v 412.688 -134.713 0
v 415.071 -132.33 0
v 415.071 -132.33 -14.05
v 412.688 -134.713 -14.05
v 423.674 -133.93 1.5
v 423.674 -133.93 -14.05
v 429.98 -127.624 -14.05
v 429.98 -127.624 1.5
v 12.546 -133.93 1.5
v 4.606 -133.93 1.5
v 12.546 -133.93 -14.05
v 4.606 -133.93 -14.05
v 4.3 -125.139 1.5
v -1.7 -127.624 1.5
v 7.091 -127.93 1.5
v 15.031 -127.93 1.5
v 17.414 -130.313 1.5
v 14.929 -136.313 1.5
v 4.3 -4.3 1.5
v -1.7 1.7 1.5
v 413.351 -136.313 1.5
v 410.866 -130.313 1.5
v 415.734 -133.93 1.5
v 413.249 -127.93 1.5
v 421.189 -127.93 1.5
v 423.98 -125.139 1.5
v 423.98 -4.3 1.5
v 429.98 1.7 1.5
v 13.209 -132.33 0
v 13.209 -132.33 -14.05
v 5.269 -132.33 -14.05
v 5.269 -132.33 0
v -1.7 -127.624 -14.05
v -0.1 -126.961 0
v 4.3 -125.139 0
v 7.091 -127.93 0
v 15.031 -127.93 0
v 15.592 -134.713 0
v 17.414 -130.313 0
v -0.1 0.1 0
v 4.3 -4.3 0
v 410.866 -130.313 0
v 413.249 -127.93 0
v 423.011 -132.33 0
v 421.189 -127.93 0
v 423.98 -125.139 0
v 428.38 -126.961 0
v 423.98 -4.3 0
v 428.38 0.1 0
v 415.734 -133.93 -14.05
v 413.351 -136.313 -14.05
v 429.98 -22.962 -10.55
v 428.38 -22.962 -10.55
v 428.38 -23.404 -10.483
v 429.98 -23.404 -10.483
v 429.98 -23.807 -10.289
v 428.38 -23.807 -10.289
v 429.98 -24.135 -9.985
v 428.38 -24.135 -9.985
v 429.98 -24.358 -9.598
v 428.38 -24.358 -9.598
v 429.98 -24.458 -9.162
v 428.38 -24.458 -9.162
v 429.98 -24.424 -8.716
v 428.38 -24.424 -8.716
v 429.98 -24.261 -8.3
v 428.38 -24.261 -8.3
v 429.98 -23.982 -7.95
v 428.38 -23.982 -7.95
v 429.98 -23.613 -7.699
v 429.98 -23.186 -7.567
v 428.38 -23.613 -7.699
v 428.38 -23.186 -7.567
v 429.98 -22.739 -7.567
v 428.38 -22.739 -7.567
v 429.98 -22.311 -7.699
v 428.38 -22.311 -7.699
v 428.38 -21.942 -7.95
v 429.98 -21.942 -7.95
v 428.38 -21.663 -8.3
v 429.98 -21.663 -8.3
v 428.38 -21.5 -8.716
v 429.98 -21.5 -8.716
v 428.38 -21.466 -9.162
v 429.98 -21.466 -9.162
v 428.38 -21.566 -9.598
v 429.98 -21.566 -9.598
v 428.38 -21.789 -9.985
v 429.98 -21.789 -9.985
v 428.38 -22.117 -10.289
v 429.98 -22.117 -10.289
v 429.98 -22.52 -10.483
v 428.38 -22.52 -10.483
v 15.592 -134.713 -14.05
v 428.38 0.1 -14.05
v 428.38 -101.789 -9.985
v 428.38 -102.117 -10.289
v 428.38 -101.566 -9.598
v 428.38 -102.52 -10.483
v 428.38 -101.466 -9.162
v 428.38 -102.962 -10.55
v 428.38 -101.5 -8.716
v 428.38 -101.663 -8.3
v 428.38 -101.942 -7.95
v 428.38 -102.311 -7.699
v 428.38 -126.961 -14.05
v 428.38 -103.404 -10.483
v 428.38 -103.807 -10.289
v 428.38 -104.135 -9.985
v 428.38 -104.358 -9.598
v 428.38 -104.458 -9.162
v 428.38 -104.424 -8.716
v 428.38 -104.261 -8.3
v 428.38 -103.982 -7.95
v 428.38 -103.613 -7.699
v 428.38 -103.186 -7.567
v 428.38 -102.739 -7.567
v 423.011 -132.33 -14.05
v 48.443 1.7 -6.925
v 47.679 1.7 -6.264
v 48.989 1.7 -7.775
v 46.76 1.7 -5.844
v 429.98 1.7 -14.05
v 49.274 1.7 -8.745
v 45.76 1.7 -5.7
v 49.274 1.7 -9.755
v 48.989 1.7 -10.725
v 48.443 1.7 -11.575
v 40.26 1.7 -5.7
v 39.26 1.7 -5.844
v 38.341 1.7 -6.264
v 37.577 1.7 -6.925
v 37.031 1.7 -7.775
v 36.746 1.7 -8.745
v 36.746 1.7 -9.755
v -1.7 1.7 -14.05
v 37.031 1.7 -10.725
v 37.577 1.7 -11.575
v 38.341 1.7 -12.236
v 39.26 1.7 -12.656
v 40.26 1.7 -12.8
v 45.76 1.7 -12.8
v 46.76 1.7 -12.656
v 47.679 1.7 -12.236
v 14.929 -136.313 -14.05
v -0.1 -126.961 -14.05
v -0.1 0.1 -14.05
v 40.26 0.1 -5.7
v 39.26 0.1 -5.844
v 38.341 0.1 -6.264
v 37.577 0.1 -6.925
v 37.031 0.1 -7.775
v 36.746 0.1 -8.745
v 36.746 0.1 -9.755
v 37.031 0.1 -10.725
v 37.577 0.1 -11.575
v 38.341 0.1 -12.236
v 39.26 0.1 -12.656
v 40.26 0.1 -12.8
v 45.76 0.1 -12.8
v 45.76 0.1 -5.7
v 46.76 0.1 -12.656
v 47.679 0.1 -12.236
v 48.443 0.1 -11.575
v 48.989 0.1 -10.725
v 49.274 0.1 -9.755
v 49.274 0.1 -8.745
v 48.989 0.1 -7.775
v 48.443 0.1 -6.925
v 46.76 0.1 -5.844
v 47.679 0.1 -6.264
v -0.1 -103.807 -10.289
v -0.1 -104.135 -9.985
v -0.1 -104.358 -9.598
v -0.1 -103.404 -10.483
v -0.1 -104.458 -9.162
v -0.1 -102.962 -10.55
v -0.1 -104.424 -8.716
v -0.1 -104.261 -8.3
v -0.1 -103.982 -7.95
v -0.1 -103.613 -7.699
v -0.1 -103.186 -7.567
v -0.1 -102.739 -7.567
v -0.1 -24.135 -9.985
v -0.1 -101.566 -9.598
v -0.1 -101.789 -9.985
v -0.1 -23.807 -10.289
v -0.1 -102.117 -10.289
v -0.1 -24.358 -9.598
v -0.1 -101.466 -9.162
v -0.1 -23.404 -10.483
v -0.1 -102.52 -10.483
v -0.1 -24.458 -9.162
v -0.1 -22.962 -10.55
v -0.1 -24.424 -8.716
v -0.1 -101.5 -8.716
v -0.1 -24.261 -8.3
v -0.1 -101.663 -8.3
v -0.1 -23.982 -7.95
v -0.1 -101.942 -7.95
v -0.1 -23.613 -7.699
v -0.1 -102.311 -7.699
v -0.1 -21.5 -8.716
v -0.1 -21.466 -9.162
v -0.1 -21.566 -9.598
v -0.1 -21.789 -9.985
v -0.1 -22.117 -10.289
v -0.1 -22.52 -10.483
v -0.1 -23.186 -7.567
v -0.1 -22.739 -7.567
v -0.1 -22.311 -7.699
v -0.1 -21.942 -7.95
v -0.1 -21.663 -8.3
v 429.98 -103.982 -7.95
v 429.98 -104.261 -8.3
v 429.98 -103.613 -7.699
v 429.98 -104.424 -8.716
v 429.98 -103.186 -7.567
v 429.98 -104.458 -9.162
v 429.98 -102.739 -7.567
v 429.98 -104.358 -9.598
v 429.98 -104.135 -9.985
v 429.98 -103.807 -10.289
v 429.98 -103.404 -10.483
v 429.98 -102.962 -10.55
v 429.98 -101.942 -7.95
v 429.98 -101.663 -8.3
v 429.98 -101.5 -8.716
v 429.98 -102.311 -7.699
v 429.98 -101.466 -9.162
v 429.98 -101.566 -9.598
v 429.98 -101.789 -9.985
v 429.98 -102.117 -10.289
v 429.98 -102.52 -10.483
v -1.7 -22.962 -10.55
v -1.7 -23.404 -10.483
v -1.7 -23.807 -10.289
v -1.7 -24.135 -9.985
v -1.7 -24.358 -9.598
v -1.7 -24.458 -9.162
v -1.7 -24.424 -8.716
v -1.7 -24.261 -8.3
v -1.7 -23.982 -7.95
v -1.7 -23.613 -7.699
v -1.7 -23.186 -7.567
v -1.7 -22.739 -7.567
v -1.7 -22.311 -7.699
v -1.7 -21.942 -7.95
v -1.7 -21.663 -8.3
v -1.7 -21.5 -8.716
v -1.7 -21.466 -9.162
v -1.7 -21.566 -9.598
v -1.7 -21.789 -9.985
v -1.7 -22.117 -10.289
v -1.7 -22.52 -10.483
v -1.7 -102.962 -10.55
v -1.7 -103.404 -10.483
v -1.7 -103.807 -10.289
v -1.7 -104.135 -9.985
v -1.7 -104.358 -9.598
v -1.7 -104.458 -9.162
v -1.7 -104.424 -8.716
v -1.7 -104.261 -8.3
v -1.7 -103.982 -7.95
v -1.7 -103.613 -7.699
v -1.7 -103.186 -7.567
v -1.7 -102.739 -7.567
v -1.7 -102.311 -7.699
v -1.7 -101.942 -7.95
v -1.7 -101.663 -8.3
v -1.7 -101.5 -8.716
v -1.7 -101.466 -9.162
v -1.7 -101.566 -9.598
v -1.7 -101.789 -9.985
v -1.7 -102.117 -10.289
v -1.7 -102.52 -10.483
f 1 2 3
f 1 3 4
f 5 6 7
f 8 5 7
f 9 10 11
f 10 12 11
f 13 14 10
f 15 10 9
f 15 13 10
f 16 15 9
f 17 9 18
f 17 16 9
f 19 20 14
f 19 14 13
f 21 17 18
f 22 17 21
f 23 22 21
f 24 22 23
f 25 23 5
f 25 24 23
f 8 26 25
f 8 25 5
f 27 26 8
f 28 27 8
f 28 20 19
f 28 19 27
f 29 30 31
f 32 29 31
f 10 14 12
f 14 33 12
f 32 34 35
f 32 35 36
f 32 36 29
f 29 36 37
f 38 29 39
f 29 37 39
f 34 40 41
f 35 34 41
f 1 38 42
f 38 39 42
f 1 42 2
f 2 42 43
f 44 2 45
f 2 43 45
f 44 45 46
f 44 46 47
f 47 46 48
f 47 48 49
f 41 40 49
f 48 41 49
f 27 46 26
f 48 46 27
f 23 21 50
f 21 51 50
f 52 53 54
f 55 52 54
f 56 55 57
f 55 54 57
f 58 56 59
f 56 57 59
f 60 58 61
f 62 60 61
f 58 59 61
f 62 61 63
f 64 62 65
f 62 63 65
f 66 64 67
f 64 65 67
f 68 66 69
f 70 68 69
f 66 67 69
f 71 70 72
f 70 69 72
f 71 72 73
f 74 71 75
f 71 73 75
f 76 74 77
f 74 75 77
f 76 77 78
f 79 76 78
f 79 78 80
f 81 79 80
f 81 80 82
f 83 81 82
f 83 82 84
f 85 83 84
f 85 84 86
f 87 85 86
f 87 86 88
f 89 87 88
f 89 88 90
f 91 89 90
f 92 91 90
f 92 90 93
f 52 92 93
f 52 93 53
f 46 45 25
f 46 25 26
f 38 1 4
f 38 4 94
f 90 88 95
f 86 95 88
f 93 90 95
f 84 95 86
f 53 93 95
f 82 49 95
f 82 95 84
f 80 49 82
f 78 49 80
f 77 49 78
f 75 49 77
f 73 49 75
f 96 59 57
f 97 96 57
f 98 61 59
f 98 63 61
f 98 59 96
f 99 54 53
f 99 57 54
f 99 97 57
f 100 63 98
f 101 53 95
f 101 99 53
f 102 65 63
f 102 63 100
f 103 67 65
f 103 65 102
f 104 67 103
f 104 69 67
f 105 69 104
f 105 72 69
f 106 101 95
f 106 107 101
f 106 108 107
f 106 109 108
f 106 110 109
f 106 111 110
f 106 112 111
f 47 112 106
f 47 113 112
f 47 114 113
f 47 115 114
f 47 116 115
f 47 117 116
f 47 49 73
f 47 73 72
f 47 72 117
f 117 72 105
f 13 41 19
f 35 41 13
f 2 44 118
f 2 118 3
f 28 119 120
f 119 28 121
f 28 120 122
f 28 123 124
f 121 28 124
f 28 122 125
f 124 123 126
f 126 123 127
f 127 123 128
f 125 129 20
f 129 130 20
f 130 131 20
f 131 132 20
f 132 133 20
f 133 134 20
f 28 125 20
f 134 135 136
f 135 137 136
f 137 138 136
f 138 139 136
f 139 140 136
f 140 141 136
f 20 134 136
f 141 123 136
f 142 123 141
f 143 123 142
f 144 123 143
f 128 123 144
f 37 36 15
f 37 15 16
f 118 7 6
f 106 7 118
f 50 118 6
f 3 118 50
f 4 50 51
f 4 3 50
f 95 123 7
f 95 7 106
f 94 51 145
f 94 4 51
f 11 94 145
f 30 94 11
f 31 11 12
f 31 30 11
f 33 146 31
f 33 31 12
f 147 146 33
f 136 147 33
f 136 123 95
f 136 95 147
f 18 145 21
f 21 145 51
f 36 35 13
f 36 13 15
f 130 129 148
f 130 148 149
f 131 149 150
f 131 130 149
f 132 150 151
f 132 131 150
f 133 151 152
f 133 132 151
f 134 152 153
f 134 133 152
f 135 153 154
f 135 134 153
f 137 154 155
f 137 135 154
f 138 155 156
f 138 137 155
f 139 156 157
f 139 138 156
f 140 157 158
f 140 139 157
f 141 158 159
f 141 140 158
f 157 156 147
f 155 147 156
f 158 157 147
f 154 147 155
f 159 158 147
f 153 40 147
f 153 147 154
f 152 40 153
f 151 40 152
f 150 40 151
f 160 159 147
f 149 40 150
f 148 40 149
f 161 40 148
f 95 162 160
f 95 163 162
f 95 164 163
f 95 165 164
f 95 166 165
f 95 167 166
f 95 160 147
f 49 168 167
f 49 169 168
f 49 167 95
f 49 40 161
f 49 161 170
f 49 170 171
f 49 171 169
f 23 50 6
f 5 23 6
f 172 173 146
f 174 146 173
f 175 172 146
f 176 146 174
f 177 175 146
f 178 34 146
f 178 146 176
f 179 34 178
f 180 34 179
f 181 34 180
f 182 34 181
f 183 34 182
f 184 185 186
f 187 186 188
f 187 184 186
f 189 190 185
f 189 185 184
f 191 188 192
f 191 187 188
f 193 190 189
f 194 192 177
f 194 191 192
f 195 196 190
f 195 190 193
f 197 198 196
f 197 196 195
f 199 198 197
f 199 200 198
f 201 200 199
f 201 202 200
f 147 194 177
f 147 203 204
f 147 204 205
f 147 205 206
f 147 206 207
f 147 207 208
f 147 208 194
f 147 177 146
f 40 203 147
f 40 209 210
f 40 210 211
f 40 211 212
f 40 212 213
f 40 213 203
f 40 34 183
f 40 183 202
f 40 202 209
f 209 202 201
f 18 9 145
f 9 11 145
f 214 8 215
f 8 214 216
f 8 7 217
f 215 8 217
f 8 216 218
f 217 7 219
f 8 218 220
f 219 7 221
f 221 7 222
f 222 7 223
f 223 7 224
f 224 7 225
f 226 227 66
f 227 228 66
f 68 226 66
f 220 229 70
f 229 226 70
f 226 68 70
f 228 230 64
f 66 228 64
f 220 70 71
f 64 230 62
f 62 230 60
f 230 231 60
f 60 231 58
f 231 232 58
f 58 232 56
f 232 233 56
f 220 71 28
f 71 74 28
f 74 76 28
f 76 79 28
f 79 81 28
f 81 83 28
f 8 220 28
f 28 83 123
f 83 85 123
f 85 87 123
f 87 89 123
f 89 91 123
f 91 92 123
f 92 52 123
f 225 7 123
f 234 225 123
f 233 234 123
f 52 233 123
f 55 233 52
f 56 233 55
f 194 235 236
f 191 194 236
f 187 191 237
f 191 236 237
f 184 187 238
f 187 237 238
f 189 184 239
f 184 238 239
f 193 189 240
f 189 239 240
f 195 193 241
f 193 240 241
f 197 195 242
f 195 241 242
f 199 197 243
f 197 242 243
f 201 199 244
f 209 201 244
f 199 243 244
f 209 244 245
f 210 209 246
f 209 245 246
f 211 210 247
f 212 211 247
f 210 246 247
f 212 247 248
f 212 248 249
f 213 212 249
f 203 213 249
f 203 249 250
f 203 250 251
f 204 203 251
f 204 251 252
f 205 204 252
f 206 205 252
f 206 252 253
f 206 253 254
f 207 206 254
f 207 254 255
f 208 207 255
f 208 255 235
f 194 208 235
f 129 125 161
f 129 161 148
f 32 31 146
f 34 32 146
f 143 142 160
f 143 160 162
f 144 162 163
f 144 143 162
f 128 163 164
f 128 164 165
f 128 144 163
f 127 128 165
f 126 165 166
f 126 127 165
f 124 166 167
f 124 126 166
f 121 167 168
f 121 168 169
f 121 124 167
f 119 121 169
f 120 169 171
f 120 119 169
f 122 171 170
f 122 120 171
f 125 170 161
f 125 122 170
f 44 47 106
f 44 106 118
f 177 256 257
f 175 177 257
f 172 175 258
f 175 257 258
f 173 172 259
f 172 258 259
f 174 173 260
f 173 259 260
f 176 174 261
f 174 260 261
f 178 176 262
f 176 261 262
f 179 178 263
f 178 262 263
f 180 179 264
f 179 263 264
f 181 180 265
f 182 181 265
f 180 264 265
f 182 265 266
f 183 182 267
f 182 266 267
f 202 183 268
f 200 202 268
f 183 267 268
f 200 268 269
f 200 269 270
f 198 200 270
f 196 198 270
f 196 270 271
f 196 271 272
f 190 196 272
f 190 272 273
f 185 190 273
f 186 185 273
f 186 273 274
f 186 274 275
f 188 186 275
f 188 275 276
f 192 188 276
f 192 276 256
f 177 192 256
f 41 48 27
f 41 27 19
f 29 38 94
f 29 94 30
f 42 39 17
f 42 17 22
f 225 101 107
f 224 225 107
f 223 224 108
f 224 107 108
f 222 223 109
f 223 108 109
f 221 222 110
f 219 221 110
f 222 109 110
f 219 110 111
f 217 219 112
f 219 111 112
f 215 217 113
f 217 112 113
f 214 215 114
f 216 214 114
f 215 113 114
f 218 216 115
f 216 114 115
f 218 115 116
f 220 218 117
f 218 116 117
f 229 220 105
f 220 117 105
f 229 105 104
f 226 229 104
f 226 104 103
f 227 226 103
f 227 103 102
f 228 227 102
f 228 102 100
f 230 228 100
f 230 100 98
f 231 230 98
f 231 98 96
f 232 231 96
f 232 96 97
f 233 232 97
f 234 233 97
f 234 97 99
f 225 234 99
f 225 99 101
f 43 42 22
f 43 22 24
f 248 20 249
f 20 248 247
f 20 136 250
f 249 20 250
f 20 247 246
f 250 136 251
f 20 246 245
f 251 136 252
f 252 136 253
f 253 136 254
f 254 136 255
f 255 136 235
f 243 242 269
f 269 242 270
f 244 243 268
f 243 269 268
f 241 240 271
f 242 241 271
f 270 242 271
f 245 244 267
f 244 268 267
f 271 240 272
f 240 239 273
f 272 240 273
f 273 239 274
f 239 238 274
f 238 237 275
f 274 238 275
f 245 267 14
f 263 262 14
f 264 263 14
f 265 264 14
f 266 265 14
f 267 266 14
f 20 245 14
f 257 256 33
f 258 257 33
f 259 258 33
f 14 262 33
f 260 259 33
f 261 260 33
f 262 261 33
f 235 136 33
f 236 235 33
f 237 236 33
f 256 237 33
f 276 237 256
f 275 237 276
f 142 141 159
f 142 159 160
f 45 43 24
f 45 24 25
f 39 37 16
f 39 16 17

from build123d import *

# Parameters (mm, degrees)
P_IDAT_VYSUNUT_M1_DEPTH  = 14.05
P_IDAT_VYSUNUT_M2_DEPTH  = 1.5
ODEBRAT_VYSUNUT_M1_DEPTH = 1.6
ODEBRAT_VYSUNUT_M2_REACH = 454.909
SKICA4_R                 = 1.5


with BuildPart() as part:
    # Skica1 → Přidat vysunutím1 (new body)
    with BuildSketch(Plane.XY):
        Polygon((-1.7, 1.7), (429.98, 1.7), (429.98, -127.624163056), (423.673791129, -133.930371927), (415.733791129, -133.930371927), (413.350841277, -136.313321779), (14.929158723, -136.313321779), (12.546208871, -133.930371927), (4.606208871, -133.930371927), (-1.7, -127.624163056), align=None)
        Polygon((-0.1, 0.1), (428.38, 0.1), (428.38, -126.961421356), (423.01104943, -132.330371927), (415.07104943, -132.330371927), (412.688099577, -134.713321779), (15.591900423, -134.713321779), (13.20895057, -132.330371927), (5.26895057, -132.330371927), (-0.1, -126.961421356), align=None, mode=Mode.SUBTRACT)
    extrude(amount=-P_IDAT_VYSUNUT_M1_DEPTH)

    # Skica2 → Přidat vysunutím2 (add)
    with BuildSketch(Plane.XY):
        Polygon((-1.7, 1.7), (-1.7, -127.624163056), (4.606208871, -133.930371927), (12.546208871, -133.930371927), (14.929158723, -136.313321779), (413.350841277, -136.313321779), (415.733791129, -133.930371927), (423.673791129, -133.930371927), (429.98, -127.624163056), (429.98, 1.7), align=None)
        Polygon((4.3, -4.3), (4.3, -125.138881682), (7.091490245, -127.930371927), (15.031490245, -127.930371927), (17.414440098, -130.313321779), (410.865559902, -130.313321779), (413.248509755, -127.930371927), (421.188509755, -127.930371927), (423.98, -125.138881682), (423.98, -4.3), align=None, mode=Mode.SUBTRACT)
    extrude(amount=P_IDAT_VYSUNUT_M2_DEPTH)

    # Skica3 → Odebrat vysunutím1 (cut)
    with BuildSketch(Plane(origin=(0, 1.7, 0), x_dir=(1, 0, 0), z_dir=(0, 1, 0))):
        with BuildLine():
            Line((45.76, 5.7), (40.26, 5.7))
            ThreePointArc((40.26, 5.7), (36.71, 9.25), (40.26, 12.8))
            Line((40.26, 12.8), (45.76, 12.8))
            ThreePointArc((45.76, 12.8), (49.31, 9.25), (45.76, 5.7))
        make_face()
    extrude(amount=-ODEBRAT_VYSUNUT_M1_DEPTH, mode=Mode.SUBTRACT)

    # Odebrat vysunutím2: up to this face of the body (flat: up to its plane)
    odebrat_vysunut_m2_end = Plane(part.part.faces().sort_by_distance((429.98, -62.962081528, -6.275))[0])
    # Skica4 → Odebrat vysunutím2 (cut, up to the picked face)
    with BuildSketch(Plane.ZY.offset(1.7), mode=Mode.PRIVATE) as odebrat_vysunut_m2_sk1:
        with Locations(Location((-9.05, -22.962081528, 0), (0, 0, 180))):
            Circle(SKICA4_R)
    odebrat_vysunut_m2_tool1 = split(extrude(odebrat_vysunut_m2_sk1.sketch, amount=-ODEBRAT_VYSUNUT_M2_REACH, mode=Mode.PRIVATE), bisect_by=odebrat_vysunut_m2_end, keep=Keep.BOTH, mode=Mode.PRIVATE)
    # Skica4 → Odebrat vysunutím2 (cut, up to the picked face)
    with BuildSketch(Plane.ZY.offset(1.7), mode=Mode.PRIVATE) as odebrat_vysunut_m2_sk2:
        with Locations(Location((-9.05, -102.962081528, 0), (0, 0, 180))):
            Circle(SKICA4_R)
    odebrat_vysunut_m2_tool2 = split(extrude(odebrat_vysunut_m2_sk2.sketch, amount=-ODEBRAT_VYSUNUT_M2_REACH, mode=Mode.PRIVATE), bisect_by=odebrat_vysunut_m2_end, keep=Keep.BOTH, mode=Mode.PRIVATE)
    add(odebrat_vysunut_m2_tool1.solids().sort_by(Axis((-1.7, -22.962082, -9.05), (1, 0, 0)))[0], mode=Mode.SUBTRACT)
    add(odebrat_vysunut_m2_tool2.solids().sort_by(Axis((-1.7, -102.962082, -9.05), (1, 0, 0)))[0], mode=Mode.SUBTRACT)


solid = part.part
